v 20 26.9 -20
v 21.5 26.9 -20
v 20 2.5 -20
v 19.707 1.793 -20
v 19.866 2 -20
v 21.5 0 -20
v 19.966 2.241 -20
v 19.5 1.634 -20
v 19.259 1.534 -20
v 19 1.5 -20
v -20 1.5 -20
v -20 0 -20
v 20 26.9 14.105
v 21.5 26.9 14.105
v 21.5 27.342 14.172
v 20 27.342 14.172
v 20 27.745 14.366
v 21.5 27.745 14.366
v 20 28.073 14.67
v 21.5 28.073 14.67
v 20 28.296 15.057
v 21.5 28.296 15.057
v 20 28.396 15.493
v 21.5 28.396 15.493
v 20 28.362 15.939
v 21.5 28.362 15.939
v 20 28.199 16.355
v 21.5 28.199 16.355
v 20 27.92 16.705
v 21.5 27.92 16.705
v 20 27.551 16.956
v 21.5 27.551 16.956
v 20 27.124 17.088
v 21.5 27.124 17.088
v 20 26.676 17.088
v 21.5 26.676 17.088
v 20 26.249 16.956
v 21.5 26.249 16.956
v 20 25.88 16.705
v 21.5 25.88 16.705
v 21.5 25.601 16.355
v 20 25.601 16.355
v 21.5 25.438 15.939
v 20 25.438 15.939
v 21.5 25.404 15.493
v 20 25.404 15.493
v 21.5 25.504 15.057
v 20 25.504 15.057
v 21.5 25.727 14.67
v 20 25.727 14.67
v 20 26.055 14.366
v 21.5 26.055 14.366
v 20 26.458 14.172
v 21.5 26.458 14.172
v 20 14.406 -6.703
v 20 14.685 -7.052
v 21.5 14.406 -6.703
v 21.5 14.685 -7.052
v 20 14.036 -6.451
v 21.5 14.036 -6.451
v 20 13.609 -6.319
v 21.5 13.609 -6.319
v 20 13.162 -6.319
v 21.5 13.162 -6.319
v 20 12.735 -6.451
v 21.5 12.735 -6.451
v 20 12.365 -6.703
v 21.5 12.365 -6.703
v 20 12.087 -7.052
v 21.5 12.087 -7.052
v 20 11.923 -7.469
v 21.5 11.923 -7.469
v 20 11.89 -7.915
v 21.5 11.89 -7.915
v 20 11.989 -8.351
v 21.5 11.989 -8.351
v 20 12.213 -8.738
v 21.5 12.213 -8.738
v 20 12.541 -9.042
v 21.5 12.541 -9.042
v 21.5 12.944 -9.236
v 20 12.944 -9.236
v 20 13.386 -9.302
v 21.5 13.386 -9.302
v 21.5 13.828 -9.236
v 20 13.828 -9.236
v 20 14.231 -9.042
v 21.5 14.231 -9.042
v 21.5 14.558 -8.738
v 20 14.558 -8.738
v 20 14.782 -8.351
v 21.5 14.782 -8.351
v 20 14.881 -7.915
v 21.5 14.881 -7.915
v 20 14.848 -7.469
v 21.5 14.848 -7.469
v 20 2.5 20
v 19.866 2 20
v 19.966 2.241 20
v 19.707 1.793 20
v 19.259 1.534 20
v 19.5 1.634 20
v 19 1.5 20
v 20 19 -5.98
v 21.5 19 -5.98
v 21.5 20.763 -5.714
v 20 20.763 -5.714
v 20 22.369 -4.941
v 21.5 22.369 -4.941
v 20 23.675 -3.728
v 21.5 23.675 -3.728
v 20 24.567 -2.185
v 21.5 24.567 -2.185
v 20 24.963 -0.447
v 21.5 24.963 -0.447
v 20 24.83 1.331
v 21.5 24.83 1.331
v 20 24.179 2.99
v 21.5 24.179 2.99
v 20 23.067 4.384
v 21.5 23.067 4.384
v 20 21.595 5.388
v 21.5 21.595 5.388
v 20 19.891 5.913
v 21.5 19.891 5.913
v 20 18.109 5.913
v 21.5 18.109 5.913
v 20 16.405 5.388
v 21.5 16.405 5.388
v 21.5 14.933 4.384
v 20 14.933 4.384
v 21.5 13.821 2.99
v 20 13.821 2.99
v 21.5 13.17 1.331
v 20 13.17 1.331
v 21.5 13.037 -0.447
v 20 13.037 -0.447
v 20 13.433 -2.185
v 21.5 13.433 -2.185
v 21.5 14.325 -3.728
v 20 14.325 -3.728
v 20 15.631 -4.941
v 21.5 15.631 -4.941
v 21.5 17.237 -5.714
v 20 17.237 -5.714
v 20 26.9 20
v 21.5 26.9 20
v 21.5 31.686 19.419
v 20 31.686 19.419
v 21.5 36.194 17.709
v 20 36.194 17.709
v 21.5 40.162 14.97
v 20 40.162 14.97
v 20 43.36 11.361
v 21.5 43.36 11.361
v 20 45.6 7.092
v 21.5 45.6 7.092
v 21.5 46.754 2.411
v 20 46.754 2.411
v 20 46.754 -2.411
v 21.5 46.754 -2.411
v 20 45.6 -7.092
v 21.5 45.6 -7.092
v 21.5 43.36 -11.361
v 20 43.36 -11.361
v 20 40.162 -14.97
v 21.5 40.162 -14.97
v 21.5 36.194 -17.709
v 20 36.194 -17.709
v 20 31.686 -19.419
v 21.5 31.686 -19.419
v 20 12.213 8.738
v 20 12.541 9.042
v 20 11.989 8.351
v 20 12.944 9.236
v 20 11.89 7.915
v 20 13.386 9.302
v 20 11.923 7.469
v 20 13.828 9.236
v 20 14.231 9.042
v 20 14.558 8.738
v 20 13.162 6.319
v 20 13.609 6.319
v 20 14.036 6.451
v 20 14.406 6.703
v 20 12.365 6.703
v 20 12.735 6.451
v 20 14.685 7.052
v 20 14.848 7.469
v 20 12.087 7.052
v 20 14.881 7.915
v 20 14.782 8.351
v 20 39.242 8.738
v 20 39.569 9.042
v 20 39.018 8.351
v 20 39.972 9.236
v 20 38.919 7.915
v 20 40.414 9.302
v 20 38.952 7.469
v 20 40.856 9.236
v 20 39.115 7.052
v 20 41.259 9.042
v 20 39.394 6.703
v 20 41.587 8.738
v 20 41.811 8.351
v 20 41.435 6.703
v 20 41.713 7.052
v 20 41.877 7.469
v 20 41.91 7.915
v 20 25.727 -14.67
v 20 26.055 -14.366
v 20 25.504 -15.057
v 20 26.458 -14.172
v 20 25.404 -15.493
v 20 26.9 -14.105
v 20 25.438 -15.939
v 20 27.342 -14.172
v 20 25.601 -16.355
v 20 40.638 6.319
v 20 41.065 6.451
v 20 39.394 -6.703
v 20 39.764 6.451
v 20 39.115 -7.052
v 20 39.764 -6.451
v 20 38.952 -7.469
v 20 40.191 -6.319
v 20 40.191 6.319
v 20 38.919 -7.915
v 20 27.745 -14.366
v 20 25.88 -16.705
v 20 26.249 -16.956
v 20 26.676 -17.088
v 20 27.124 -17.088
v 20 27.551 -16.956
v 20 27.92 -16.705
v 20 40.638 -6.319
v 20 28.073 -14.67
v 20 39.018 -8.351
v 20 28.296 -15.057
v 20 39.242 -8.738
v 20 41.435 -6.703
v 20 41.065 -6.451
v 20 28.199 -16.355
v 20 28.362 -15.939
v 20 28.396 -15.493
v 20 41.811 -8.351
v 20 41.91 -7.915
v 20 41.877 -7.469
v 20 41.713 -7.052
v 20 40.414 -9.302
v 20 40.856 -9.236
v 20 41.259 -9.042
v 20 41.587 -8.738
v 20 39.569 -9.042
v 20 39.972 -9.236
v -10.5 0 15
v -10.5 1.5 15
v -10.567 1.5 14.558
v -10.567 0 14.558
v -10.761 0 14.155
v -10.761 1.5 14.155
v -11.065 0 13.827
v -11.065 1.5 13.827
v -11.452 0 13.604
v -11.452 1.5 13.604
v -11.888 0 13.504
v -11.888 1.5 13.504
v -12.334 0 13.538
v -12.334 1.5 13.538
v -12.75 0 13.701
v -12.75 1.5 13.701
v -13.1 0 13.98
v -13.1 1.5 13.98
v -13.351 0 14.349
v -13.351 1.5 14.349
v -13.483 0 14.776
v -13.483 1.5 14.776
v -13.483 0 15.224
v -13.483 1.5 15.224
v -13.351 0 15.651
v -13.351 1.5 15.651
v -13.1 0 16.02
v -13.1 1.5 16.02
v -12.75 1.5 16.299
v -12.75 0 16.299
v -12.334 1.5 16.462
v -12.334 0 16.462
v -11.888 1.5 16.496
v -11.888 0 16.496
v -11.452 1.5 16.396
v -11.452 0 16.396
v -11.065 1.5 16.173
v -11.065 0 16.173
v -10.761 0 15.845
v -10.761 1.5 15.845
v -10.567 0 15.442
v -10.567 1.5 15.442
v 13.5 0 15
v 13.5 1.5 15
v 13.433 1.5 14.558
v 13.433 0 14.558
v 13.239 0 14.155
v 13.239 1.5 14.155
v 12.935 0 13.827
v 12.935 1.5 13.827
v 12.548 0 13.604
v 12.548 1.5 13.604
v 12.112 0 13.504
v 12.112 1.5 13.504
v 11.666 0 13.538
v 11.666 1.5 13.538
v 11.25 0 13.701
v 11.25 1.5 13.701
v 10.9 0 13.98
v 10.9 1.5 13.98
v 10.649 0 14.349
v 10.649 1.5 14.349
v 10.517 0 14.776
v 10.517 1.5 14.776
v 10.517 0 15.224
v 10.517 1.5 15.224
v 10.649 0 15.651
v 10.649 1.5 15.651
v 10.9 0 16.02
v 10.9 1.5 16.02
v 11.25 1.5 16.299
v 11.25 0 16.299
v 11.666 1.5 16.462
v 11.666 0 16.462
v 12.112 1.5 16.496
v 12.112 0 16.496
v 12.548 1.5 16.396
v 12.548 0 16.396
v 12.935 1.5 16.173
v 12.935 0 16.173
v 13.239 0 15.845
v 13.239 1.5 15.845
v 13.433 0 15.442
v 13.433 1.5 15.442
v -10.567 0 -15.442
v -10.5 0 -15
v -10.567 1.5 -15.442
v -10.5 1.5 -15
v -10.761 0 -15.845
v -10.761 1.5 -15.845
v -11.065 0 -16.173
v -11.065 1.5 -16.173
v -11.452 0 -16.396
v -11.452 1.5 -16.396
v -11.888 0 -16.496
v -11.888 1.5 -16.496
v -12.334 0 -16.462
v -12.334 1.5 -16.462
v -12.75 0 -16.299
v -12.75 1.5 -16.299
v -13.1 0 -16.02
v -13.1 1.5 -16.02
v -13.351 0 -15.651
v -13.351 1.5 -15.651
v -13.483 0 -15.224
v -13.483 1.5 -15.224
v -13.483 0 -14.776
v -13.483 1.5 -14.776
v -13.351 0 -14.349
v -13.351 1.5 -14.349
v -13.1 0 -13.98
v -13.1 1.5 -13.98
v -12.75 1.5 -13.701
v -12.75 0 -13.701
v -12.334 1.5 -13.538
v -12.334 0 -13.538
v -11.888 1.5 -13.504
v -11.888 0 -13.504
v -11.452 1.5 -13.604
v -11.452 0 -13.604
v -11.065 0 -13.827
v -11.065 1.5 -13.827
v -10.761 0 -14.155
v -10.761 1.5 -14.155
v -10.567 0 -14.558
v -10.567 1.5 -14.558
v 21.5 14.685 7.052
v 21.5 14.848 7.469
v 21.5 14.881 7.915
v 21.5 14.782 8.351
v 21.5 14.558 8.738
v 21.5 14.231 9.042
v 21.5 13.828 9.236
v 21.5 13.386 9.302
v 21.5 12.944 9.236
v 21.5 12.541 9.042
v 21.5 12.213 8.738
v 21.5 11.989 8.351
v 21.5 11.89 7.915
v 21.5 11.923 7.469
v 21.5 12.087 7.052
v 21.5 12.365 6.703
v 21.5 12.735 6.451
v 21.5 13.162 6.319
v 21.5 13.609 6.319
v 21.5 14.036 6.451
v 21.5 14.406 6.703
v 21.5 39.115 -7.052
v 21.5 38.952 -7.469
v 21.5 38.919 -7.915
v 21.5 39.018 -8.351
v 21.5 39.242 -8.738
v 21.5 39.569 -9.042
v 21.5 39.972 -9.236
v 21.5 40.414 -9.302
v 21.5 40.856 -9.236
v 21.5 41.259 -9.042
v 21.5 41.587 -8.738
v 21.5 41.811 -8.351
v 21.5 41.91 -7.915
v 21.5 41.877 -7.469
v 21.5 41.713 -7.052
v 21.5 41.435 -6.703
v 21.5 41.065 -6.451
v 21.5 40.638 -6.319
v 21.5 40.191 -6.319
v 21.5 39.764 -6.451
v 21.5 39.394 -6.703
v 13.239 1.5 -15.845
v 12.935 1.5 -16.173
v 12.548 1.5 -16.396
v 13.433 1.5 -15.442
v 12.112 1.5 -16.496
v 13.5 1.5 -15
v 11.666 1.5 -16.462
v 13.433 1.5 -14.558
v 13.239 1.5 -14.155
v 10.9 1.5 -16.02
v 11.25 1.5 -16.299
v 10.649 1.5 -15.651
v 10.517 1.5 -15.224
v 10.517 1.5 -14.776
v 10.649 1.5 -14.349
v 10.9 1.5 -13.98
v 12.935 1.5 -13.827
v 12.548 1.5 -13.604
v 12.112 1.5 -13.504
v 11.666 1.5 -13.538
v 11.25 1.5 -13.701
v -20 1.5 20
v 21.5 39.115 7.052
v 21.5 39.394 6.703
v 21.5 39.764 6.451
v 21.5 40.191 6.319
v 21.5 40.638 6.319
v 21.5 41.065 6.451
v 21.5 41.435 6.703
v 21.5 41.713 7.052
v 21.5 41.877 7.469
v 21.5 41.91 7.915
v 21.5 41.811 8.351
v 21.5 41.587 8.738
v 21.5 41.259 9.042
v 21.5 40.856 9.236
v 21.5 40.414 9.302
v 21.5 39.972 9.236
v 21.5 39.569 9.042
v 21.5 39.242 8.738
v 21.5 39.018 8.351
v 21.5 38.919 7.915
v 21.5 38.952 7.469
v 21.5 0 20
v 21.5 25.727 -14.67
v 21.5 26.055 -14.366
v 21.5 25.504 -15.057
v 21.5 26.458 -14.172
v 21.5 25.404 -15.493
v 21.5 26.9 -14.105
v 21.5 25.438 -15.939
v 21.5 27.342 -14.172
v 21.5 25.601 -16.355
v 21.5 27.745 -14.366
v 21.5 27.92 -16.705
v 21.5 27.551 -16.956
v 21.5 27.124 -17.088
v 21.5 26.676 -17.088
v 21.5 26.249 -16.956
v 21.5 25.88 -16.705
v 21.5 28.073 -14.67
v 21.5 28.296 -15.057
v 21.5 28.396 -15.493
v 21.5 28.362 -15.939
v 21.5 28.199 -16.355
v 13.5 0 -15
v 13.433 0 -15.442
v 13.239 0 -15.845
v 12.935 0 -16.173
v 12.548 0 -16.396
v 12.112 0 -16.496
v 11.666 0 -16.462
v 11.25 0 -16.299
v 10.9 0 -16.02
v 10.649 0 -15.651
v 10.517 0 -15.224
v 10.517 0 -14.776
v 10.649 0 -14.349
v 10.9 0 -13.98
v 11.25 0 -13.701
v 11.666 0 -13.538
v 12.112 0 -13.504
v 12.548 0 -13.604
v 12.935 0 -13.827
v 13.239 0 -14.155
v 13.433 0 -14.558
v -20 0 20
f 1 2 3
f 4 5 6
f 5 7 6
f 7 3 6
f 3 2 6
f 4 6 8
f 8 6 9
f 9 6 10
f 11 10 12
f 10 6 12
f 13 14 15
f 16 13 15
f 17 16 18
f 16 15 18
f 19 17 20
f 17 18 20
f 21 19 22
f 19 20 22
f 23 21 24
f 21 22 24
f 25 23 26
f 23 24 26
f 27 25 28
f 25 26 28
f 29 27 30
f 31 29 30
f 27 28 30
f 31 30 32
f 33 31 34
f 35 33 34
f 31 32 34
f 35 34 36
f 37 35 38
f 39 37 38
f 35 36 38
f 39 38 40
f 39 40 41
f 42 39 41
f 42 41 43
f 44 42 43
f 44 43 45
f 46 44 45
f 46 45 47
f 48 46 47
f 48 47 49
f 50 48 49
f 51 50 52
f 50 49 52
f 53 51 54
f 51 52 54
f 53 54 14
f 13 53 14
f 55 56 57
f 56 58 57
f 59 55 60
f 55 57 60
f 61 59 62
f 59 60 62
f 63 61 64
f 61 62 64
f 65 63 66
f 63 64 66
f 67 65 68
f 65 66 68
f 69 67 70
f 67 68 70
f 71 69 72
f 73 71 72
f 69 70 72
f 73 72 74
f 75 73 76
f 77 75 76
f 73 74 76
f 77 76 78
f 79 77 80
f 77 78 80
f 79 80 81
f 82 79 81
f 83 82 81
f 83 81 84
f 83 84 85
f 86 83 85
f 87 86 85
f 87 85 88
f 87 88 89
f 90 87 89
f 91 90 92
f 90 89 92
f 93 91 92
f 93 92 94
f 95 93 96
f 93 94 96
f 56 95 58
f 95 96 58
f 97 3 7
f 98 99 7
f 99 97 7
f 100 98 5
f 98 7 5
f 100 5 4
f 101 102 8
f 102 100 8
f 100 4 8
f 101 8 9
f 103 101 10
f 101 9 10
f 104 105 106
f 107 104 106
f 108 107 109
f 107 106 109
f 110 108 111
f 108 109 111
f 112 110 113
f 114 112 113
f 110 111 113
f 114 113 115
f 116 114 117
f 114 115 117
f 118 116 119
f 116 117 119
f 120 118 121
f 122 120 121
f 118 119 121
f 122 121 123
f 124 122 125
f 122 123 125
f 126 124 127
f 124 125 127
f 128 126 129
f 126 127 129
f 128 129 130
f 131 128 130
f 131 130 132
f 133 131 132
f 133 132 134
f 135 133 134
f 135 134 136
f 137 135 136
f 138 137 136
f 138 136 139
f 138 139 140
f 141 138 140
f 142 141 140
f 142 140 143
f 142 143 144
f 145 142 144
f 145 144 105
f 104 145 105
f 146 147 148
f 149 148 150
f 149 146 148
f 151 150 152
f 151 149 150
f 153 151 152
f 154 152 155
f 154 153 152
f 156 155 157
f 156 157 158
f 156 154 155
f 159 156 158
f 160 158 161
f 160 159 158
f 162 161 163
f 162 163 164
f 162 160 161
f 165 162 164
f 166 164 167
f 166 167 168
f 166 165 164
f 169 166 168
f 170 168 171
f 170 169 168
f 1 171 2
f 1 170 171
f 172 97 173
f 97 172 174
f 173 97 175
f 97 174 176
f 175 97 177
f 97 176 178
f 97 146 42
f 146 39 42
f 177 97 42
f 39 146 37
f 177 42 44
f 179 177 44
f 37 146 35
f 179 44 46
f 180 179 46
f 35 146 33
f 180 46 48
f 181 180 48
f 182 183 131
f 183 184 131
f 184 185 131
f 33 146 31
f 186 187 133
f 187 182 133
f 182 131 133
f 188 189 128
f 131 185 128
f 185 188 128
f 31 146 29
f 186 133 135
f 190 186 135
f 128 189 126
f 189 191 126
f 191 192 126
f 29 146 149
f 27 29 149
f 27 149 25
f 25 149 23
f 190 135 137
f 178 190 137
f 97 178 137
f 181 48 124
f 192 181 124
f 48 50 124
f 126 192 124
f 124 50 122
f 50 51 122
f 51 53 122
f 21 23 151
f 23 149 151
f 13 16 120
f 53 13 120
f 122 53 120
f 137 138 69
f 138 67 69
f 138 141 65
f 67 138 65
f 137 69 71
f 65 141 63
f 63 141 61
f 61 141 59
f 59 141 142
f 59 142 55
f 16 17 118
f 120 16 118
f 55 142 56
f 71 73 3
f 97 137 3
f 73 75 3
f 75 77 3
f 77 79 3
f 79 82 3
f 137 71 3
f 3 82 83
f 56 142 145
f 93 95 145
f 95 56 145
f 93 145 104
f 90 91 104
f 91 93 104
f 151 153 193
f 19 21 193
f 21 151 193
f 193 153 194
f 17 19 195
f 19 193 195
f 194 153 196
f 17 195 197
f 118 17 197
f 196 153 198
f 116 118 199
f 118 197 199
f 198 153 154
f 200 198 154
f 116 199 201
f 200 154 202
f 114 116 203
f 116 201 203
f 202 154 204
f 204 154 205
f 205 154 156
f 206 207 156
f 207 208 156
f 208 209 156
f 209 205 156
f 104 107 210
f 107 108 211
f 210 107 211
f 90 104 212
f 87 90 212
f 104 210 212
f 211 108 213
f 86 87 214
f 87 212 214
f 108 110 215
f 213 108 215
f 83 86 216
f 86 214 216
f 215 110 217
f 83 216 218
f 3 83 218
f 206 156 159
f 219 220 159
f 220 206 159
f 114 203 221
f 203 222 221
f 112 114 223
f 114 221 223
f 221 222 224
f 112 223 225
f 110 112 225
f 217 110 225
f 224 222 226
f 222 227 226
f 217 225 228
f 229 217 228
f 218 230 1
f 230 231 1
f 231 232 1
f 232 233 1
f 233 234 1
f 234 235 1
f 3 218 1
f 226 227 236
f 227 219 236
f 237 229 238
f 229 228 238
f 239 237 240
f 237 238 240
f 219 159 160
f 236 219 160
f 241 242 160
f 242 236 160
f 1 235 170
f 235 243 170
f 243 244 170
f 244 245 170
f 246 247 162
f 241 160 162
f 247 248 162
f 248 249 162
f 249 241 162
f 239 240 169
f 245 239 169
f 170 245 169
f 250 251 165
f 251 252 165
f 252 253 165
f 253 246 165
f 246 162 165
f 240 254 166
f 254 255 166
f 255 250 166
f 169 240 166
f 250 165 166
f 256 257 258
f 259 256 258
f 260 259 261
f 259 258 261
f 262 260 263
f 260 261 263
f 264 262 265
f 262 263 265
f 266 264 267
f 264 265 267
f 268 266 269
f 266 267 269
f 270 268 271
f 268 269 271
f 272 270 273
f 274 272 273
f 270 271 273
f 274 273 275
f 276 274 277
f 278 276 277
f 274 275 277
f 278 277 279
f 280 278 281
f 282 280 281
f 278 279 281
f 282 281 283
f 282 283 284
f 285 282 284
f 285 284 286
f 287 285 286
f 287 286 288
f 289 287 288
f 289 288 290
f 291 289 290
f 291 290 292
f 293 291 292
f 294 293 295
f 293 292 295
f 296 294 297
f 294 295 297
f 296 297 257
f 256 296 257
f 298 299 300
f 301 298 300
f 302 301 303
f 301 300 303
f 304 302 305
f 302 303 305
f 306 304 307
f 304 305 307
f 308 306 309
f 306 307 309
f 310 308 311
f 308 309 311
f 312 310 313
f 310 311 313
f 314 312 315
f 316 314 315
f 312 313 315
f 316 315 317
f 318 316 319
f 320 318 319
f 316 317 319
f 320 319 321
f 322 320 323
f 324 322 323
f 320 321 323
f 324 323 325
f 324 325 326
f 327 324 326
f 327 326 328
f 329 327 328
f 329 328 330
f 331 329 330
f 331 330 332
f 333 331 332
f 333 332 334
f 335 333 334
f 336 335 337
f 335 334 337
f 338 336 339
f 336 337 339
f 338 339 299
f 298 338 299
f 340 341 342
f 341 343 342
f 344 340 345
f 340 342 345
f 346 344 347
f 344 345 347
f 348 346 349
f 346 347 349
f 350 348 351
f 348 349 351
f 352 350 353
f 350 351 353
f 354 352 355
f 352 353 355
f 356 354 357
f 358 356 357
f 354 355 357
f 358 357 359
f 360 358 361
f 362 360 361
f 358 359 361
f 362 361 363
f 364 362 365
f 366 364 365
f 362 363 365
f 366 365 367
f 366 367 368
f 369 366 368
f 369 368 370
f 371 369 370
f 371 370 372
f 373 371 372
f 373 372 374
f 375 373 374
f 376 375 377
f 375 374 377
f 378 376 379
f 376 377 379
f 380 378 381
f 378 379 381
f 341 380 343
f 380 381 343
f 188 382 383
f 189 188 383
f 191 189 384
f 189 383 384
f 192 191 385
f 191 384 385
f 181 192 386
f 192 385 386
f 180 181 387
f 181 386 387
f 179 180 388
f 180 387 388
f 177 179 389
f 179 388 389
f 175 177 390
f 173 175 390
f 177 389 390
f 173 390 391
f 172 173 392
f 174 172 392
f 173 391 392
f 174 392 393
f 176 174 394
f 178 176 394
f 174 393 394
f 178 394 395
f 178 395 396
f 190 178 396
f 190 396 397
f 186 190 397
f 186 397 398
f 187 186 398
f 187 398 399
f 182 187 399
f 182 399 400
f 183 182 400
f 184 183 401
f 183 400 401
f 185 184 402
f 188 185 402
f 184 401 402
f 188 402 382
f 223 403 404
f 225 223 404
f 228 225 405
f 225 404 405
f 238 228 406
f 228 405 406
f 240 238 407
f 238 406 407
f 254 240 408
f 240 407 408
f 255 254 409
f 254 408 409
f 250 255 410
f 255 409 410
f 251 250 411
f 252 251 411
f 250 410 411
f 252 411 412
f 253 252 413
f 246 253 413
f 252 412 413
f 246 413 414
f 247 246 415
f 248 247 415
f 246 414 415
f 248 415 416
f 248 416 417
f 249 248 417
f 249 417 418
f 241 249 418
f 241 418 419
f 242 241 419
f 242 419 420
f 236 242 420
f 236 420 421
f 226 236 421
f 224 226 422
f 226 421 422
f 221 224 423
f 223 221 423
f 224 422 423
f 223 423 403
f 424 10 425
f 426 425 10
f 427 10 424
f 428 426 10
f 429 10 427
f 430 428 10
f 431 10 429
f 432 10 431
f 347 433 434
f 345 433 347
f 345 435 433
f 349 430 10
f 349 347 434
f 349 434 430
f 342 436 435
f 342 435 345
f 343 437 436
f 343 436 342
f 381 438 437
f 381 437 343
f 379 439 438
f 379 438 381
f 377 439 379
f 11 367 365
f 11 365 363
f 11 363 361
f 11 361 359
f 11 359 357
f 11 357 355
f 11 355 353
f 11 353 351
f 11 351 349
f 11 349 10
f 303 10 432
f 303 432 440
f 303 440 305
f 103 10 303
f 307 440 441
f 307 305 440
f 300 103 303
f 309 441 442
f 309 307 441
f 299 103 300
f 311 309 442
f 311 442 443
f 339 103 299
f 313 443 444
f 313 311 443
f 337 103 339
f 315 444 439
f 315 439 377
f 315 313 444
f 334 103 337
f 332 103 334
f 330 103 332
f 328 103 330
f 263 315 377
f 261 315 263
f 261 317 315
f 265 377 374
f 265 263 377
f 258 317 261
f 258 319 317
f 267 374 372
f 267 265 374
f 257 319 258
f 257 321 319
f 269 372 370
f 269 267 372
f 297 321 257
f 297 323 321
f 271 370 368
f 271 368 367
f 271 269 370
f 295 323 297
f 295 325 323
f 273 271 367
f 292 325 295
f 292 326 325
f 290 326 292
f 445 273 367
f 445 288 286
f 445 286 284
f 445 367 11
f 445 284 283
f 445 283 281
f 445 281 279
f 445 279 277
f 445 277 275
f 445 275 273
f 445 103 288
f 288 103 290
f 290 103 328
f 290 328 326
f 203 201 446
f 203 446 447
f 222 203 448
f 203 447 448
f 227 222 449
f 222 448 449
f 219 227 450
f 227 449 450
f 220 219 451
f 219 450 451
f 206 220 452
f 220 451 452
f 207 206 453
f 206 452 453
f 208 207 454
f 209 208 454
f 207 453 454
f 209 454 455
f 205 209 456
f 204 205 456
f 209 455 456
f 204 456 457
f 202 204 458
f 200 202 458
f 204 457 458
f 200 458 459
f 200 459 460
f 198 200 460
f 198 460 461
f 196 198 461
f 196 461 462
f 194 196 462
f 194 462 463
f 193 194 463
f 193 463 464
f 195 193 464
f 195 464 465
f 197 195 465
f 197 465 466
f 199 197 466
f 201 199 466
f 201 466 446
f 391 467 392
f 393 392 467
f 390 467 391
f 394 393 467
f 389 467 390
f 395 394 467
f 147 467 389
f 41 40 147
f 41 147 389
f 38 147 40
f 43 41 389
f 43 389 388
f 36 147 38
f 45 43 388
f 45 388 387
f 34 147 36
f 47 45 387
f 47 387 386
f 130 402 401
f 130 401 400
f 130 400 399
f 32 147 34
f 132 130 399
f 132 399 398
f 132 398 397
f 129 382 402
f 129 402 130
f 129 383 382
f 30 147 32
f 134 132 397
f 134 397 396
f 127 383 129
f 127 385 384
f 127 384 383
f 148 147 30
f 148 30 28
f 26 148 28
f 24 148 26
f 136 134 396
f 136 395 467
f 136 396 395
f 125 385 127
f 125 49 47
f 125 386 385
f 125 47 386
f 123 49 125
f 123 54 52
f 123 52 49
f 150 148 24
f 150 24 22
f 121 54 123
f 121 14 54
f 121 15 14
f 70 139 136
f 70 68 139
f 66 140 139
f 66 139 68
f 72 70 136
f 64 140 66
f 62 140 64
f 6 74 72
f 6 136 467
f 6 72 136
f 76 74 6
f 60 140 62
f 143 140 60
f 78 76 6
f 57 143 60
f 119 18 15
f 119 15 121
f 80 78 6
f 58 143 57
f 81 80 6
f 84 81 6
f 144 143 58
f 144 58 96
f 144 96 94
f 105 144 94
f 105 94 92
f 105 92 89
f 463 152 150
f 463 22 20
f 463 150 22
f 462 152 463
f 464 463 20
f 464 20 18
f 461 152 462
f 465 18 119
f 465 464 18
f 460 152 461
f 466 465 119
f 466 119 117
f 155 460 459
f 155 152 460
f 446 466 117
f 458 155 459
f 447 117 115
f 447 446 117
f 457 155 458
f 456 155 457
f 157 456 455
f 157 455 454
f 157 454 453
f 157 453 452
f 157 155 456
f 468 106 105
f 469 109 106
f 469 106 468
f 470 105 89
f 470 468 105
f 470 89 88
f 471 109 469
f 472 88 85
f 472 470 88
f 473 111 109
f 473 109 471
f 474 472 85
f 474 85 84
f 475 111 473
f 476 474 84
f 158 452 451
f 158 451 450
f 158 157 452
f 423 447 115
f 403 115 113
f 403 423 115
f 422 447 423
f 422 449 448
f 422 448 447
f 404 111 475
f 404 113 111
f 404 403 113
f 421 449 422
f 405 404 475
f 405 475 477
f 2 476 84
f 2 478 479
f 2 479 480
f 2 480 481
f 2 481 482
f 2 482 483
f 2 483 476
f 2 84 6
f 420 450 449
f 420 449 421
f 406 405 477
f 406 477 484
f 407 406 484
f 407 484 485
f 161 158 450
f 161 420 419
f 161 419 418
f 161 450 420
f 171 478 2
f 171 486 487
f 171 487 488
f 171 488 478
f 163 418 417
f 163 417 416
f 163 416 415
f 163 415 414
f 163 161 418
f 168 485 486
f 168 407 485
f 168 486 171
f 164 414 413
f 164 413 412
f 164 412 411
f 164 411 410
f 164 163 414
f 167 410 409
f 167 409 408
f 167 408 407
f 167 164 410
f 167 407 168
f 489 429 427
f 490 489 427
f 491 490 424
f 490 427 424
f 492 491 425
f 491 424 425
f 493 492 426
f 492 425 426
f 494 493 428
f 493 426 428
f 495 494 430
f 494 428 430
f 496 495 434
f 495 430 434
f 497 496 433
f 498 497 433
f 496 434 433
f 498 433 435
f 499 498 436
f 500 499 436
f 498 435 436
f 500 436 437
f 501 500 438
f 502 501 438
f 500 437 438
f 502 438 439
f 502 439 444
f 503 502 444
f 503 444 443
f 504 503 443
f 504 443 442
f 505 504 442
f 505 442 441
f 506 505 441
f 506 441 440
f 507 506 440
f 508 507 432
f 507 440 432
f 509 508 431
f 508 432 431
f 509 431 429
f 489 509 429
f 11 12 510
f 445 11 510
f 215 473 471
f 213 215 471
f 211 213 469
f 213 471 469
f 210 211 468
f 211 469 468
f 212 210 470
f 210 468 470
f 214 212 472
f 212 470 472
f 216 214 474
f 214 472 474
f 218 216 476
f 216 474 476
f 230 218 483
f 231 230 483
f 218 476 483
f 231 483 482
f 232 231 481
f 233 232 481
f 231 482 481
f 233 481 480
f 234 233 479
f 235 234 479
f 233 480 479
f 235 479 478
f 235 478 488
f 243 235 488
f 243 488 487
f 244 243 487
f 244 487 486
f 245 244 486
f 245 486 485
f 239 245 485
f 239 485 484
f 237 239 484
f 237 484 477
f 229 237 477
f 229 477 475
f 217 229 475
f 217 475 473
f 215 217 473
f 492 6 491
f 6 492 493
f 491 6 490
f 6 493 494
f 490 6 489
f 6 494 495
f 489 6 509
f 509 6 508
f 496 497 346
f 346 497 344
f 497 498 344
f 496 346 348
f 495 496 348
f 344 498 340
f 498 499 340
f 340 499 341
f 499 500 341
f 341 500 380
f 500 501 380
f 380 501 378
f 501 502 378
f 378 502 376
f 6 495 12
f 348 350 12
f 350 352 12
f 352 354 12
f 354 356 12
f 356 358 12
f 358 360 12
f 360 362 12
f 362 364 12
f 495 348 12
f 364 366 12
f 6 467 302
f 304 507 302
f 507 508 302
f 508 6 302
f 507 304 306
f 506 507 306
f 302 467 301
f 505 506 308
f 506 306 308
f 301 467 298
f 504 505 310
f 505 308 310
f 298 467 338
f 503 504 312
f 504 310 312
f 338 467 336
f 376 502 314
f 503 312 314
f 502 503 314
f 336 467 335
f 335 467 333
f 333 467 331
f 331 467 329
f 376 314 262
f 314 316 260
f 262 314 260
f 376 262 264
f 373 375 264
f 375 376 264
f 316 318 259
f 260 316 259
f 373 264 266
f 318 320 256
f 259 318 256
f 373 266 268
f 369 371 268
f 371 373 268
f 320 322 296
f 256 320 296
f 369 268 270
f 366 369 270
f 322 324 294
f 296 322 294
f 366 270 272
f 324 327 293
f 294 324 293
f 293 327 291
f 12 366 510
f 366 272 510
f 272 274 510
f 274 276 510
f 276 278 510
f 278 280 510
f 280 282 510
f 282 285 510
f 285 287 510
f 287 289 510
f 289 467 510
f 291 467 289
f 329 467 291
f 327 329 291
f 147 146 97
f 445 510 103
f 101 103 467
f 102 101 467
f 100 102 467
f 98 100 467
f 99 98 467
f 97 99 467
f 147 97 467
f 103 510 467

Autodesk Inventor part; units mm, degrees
ref_plane "YZ Plane" through (0, 0, 0) normal (1, 0, 0) x (0, 1, 0)
ref_plane "XZ Plane" through (0, 0, 0) normal (0, 1, 0) x (-1, 0, 0)
ref_plane "XY Plane" through (0, 0, 0) normal (0, 0, 1) x (1, 0, 0)
sketch "Sketch1" plane through (0, 0, 0) normal (0, 1, 0) x (-1, 0, 0)
  line L0 (-20, 20) -> (-20, -20)
  line L1 (-20, -20) -> (20, -20)
  line L2 (20, -20) -> (20, 20)
  line L3 (20, 20) -> (-20, 20)
  line L4 (-20, 20) -> (20, -20) construction
  line L5 (-20, -20) -> (20, 20) construction
  point P0 (0, 0)
  point P1 (0, -20)
  dimension "d0" = 40
  dimension "d1" = 40
extrude "Extrusion1" add sketch "Sketch1" along normal blind 1.5
sketch "Sketch2" plane through (20, 0, 20) normal (1, 0, 0) x (0, 0, -1)
  circle A0 centre (20, 26.9) radius 20
  line L0 (40, 1.5) -> (40, 46.9)
  line L1 (40, 1.5) -> (0, 1.5) projected
  line L2 (0, 1.5) -> (0, 46.9)
  line L3 (0, 46.9) -> (40, 46.9)
  line L4 (0, 0) -> (40, 0) projected
  line L5 (0, 0) -> (0, 1.5) projected
  line L6 (0, 1.5) -> (0, 0)
  line L7 (40, 0) -> (0, 0) projected
  line L8 (0, 0) -> (40, 0)
  line L9 (40, 0) -> (40, 1.5) projected
  line L10 (40, 0) -> (40, 1.5)
  point P0 (20, 0)
  point P1 (40, 26.9)
  point P2 (0, 26.9)
  dimension "d4" = 45.4
extrude "Extrusion2" add sketch "Sketch2" along normal blind 1.5 contours A0 | L0 L1 L2 A0 | L9 L4 L5 L1
fillet "Fillet1" radius 1 1 edges at (20, 1.5, 0)
sketch "Sketch3" plane through (21.5, 0, 20) normal (1, 0, 0) x (0, 0, -1)
  arc A0 (40, 26.9) -> (0, 26.9) centre (20, 26.9) ccw projected
  circle A1 centre (20, 26.9) radius 15.605
  circle A2 centre (20, 19) radius 5.98
  circle A3 centre (4.395, 26.9) radius 1.5
  point P0 (20, 0)
  dimension "d8" = 31.21
  dimension "d9" = 7.9
  dimension "d10" = 11.96
  dimension "d11" = 3
extrude "Extrusion3" cut sketch "Sketch3" against normal up to surface (1.5 mm away) contours A2
extrude "Extrusion4" cut sketch "Sketch3" against normal up to surface (1.5 mm away) contours A3 A1 | A1 A3 picked at (4.9003, 26.9) picked at (3.9042, 26.9621)
pattern_circular "Circular Pattern1" count 6 over 360 about axis through (20, 26.9, 0) along (1, 0, 0) of "Extrusion4"
sketch "Sketch4" plane through (0, 1.5, 0) normal (0, 1, 0) x (1, 0, 0)
  line L0 (12, 15) -> (-12, 15)
  line L1 (-12, 15) -> (-12, -15)
  line L2 (-12, -15) -> (12, -15)
  line L3 (12, -15) -> (12, 15)
  line L4 (-20, 20) -> (-20, -20) projected
  line L5 (-20, -20) -> (19, -20) projected
  circle A0 centre (-12, 15) radius 1.5
  point P0 (0, 0)
  dimension "d19" = 30
  dimension "d20" = 24
  dimension "d21" = 8
  dimension "d22" = 5
  dimension "d23" = 3
extrude "Extrusion5" cut sketch "Sketch4" against normal up to surface (1.5 mm away) contours A0 L1 L0 | L0 L1 A0
pattern_linear "Rectangular Pattern1" count 2 spacing 24 along (1, 0, 0) count 2 spacing 30 along (0, 0, 1) of "Extrusion5"
properties part number "motor_support"
